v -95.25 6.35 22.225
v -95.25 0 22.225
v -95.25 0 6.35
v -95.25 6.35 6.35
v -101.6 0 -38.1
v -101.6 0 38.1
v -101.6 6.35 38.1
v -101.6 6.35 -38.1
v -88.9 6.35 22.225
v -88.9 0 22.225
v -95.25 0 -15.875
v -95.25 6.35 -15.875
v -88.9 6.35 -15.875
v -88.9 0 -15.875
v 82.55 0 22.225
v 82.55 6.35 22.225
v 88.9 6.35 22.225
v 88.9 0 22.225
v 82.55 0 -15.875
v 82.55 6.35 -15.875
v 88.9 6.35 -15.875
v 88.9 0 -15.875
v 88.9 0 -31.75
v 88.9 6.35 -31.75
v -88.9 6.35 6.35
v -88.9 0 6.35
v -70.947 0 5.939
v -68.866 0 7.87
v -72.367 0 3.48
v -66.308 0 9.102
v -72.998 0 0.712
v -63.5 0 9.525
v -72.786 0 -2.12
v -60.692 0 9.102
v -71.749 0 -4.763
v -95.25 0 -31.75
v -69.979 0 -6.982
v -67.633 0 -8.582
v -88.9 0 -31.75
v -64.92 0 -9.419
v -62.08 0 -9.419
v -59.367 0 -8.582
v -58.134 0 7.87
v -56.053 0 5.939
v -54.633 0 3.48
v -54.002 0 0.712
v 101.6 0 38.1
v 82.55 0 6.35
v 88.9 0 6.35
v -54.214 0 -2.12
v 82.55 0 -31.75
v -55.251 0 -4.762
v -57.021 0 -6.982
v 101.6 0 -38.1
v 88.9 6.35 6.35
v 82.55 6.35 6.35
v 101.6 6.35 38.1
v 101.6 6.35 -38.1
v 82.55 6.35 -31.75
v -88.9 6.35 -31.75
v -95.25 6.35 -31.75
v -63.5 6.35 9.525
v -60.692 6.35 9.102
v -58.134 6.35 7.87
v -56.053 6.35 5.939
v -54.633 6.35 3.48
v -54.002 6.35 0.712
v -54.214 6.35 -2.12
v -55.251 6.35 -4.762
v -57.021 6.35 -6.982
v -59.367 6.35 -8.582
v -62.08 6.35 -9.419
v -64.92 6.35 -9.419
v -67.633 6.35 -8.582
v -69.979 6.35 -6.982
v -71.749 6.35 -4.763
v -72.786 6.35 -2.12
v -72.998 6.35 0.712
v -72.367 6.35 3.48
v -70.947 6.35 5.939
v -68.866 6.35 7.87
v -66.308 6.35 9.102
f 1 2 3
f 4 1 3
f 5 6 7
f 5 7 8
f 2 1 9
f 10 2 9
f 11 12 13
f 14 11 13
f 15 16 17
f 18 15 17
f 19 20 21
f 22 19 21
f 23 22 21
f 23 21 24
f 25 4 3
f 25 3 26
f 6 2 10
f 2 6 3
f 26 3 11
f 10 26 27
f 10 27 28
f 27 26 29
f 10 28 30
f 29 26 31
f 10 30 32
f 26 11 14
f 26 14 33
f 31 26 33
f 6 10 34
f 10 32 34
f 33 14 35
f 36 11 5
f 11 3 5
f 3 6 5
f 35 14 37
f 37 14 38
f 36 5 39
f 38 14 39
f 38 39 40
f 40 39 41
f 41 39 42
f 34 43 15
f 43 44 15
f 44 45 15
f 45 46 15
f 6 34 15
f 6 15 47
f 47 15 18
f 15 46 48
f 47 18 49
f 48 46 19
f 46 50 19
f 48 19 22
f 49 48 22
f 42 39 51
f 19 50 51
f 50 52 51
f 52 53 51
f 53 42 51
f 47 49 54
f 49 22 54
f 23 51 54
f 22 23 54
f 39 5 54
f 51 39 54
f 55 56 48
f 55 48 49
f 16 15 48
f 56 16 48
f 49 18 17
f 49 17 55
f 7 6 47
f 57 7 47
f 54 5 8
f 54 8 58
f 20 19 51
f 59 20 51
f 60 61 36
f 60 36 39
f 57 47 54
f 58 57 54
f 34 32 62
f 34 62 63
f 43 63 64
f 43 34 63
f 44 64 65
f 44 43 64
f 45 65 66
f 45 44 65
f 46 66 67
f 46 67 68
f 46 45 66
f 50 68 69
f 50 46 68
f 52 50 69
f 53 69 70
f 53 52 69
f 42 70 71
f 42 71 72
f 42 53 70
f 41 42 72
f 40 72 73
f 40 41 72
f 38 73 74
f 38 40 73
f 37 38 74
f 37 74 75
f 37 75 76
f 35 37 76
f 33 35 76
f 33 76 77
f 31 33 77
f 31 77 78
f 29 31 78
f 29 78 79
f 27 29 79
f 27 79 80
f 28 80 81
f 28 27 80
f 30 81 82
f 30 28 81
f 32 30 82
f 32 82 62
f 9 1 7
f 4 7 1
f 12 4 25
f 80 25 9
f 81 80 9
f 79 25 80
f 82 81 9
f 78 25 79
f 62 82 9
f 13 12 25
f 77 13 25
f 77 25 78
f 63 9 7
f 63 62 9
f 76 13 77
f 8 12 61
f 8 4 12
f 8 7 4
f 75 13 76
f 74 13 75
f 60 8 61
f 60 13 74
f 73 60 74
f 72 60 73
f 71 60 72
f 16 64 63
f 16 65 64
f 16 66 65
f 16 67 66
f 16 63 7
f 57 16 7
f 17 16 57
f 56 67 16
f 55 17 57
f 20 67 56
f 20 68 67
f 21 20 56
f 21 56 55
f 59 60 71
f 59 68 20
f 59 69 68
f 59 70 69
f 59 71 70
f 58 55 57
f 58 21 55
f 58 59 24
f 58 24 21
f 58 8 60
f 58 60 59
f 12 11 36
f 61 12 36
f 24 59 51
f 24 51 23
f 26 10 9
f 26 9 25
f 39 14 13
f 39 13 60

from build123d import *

# Parameters (mm, degrees)
SKETCH1_W           = 203.2
SKETCH1_H           = 76.2
SKETCH1_R           = 9.525
SKETCH1_W_2         = 6.35
SKETCH1_H_2         = 15.875
BOSS_EXTRUDE1_DEPTH = 6.35


with BuildPart() as part:
    # Sketch1 → Boss-Extrude1 (new body)
    with BuildSketch(Plane(origin=(0, 0, 0), x_dir=(1, 0, 0), z_dir=(0, 1, 0))):
        Rectangle(SKETCH1_W, SKETCH1_H)
        with Locations(Location((-63.5, 0, 0), (0, 0, 270))):
            Circle(SKETCH1_R, mode=Mode.SUBTRACT)
        with Locations((-92.075, -14.2875)):
            Rectangle(SKETCH1_W_2, SKETCH1_H_2, mode=Mode.SUBTRACT)
        with Locations((-92.075, 23.8125)):
            Rectangle(SKETCH1_W_2, SKETCH1_H_2, mode=Mode.SUBTRACT)
        with Locations((85.725, 23.8125)):
            Rectangle(SKETCH1_W_2, SKETCH1_H_2, mode=Mode.SUBTRACT)
        with Locations((85.725, -14.2875)):
            Rectangle(SKETCH1_W_2, SKETCH1_H_2, mode=Mode.SUBTRACT)
    extrude(amount=BOSS_EXTRUDE1_DEPTH)


solid = part.part
